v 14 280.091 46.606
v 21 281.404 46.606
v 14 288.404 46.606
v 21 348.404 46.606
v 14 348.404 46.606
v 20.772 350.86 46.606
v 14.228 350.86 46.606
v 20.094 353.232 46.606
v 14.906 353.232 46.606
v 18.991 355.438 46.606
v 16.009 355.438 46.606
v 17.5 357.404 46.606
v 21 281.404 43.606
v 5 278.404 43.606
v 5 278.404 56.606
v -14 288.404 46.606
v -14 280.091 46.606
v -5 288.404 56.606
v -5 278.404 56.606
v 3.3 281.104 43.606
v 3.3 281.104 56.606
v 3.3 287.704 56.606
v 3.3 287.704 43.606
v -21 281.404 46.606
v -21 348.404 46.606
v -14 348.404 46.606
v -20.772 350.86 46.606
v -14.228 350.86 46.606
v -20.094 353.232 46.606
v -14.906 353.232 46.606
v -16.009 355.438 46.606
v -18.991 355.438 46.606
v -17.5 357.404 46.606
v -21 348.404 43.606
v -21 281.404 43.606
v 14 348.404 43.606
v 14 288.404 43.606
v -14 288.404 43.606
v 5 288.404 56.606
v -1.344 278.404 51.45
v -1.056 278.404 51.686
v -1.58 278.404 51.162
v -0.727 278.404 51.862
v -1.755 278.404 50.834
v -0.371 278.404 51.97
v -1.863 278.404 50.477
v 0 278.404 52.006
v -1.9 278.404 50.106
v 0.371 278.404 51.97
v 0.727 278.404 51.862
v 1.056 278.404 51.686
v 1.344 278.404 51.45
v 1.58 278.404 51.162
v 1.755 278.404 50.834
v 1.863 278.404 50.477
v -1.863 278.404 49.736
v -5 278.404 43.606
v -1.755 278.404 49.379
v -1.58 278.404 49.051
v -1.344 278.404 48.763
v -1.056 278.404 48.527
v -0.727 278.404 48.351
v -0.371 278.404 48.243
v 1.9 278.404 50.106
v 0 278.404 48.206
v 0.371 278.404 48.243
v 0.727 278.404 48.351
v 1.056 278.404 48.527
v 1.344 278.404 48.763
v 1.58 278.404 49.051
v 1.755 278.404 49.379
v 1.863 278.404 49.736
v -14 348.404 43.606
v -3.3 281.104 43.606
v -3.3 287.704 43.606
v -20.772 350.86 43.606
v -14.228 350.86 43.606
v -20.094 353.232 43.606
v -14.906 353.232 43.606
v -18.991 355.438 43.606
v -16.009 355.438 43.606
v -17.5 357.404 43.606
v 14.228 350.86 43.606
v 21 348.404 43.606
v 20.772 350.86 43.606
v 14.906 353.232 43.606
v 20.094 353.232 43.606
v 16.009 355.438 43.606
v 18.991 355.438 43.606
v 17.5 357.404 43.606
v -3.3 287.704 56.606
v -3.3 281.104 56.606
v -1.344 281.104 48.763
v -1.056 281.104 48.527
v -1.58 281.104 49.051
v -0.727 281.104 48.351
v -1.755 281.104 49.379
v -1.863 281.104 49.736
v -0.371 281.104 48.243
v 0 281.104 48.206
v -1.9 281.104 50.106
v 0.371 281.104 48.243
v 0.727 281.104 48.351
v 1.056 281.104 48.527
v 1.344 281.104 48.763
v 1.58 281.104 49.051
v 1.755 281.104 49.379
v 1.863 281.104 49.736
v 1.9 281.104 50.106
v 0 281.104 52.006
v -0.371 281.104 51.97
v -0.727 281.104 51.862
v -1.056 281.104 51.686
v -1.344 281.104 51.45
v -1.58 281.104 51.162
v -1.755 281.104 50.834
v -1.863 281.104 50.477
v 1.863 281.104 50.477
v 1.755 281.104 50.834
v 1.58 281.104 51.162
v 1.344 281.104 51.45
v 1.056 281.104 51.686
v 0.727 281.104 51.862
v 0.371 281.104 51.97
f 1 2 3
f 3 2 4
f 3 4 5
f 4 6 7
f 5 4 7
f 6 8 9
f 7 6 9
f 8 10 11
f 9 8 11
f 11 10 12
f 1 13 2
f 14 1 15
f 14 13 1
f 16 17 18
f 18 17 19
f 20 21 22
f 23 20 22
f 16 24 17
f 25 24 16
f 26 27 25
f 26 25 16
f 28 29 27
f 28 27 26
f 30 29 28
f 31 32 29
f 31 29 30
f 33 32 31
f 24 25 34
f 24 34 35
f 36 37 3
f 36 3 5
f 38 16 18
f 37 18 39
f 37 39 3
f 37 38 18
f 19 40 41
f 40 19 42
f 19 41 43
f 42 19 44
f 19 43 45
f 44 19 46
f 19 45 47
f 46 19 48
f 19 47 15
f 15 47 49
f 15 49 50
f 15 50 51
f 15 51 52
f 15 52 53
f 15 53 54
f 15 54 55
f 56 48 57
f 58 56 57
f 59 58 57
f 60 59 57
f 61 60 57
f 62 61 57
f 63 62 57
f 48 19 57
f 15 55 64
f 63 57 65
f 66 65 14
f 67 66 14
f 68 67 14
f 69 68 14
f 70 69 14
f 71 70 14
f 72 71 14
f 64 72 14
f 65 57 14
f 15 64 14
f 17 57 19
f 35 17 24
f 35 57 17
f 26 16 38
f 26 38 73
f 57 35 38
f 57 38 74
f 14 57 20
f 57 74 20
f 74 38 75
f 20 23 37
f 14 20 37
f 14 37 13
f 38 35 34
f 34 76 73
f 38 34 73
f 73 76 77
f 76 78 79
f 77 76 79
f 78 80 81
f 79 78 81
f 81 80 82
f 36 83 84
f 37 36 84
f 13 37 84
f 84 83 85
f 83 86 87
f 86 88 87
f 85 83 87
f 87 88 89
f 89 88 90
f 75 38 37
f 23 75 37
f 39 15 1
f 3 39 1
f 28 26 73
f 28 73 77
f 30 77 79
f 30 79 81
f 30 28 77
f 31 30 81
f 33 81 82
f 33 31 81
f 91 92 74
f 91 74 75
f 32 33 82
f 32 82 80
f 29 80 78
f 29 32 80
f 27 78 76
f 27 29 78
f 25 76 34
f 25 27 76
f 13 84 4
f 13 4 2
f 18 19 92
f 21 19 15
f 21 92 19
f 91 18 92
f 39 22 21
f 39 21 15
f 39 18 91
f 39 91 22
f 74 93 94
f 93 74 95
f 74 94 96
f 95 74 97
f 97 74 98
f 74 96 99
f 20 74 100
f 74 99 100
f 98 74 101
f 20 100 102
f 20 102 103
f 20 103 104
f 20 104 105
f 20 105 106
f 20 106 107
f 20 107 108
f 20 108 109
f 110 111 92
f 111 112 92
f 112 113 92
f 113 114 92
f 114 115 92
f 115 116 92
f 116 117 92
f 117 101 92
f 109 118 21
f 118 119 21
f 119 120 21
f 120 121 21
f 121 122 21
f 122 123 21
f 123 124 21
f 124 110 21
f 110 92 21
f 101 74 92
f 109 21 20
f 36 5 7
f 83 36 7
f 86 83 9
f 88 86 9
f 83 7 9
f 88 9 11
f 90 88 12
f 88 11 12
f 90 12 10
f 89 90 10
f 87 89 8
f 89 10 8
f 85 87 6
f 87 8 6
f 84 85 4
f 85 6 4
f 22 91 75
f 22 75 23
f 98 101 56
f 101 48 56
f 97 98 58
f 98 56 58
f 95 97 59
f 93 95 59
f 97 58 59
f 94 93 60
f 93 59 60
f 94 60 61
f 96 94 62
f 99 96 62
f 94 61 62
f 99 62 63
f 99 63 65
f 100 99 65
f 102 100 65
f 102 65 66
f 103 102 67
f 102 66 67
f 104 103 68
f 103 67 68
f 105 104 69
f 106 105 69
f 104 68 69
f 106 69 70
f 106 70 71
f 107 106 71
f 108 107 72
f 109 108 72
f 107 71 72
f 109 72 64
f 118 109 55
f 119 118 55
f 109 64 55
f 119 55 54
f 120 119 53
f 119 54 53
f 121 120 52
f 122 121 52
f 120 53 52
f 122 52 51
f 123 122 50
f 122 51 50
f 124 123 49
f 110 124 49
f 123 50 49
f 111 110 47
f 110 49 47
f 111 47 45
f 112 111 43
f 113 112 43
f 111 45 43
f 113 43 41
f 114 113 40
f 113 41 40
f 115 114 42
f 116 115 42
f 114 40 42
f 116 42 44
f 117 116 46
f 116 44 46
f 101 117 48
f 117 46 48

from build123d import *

# Parameters (mm, degrees)
SALIENTE_EXTRUIR1_DEPTH             = 3
CROQUIS2_W                          = 10
CROQUIS2_H                          = 10
SALIENTE_EXTRUIR2_DEPTH             = 10
CROQUIS3_W                          = 6.2
CROQUIS3_H                          = 6.2
CORTAR_EXTRUIR1_DEPTH               = 349.280563017
NGULO_START                         = 278.403728499
NGULO_DE_SALIDA1_DEPTH              = 10
NGULO_START_2                       = 46.606431878
NGULO_DE_SALIDA1_2_DEPTH            = 11.393568122
DI_METRO_DE_TALADRO_3_8_3_8_1_D     = 3.8
DI_METRO_DE_TALADRO_3_8_3_8_1_DEPTH = 2.9
REDONDEO1_R                         = 0.4
CROQUIS7_W                          = 7
CROQUIS7_H                          = 10
SALIENTE_EXTRUIR3_DEPTH             = 3
CROQUIS8_W                          = 6.6
CROQUIS8_H                          = 6.6
CORTAR_EXTRUIR2_DEPTH               = 359.256088776


with BuildPart() as part:
    # Croquis1 → Saliente-Extruir1 (new body)
    with BuildSketch(Plane(origin=(0, 0, 43.606431878), x_dir=(-1, 0, 0), z_dir=(0, 0, -1))):
        with BuildLine():
            Line((-21, 338.403728499), (-21, 281.403728499))
            Line((-21, 281.403728499), (-5, 278.403728499))
            Line((-5, 278.403728499), (5, 278.403728499))
            Line((5, 278.403728499), (21, 281.403728499))
            Line((21, 281.403728499), (21, 338.403728499))
            ThreePointArc((21, 338.403728499), (20.094205089, 343.232030478), (17.5, 347.403728499))
            ThreePointArc((17.5, 347.403728499), (14.905794911, 343.232030478), (14, 338.403728499))
            Line((14, 338.403728499), (14, 288.403728499))
            Line((14, 288.403728499), (-14, 288.403728499))
            Line((-14, 288.403728499), (-14, 338.403728499))
            ThreePointArc((-14, 338.403728499), (-14.905794911, 343.232030478), (-17.5, 347.403728499))
            ThreePointArc((-17.5, 347.403728499), (-20.094205089, 343.232030478), (-21, 338.403728499))
        make_face()
    extrude(amount=-SALIENTE_EXTRUIR1_DEPTH)

    # Croquis2 → Saliente-Extruir2 (add)
    with BuildSketch(Plane.XY.offset(46.606431878)):
        with Locations((0, 283.403728499)):
            Rectangle(CROQUIS2_W, CROQUIS2_H)
    extrude(amount=SALIENTE_EXTRUIR2_DEPTH)

    # Croquis3 → Cortar-Extruir1 (cut, through all)
    with BuildSketch(Plane.XY.offset(56.606431878)):
        with Locations((0, 284.403728499)):
            Rectangle(CROQUIS3_W, CROQUIS3_H)
    extrude(amount=-CORTAR_EXTRUIR1_DEPTH, mode=Mode.SUBTRACT)

    # Ángulo de salida1: read off the stored shape, not the designer's step
    # Ángulo de salida1 outline → Ángulo de salida1 (add)
    with BuildSketch(Plane(origin=(0, 0, 0), x_dir=(1, 0, 0), z_dir=(0, 1, 0)).offset(NGULO_START)):
        Polygon((-5, -46.606431878), (-14, -46.606431878), (-5, -56.606431878), align=None)
        Polygon((5, -46.606431878), (5, -56.606431878), (14, -46.606431878), align=None)
    extrude(amount=NGULO_DE_SALIDA1_DEPTH)

    # ngulo de salida1 2 outline → ngulo de salida1 2 (cut)
    with BuildSketch(Plane.XY.offset(NGULO_START_2)):
        Polygon((-5, 278.403728499), (-16, 280.466228499), (-16, 278.403728499), align=None)
        Polygon((15, 280.278728499), (5, 278.403728499), (15, 278.403728499), align=None)
    extrude(amount=NGULO_DE_SALIDA1_2_DEPTH, mode=Mode.SUBTRACT)

    # Diámetro de taladro Ø3.8 (3.8)1
    with Locations(Plane(origin=(0, 281.303728499, 0), x_dir=(1, 0, 0), z_dir=(0, 1, 0))):
        with Locations((0, -50.106431878)):
            Hole(DI_METRO_DE_TALADRO_3_8_3_8_1_D / 2, depth=DI_METRO_DE_TALADRO_3_8_3_8_1_DEPTH)

    # Redondeo1
    redondeo1_edges = [part.edges().sort_by_distance(p)[0] for p in [
        (-17.5, 347.403728499, 45.106431878),
        (17.5, 347.403728499, 45.106431878),
    ]]
    fillet(redondeo1_edges, radius=REDONDEO1_R)

    # Croquis7 → Saliente-Extruir3 (add, through all)
    with BuildSketch(Plane.XY.offset(46.606431878)):
        with BuildLine():
            Line((-14, 338.403728499), (-14, 348.403728499))
            Line((-14, 348.403728499), (-21, 348.403728499))
            Line((-21, 348.403728499), (-21, 338.403728499))
            ThreePointArc((-21, 338.403728499), (-20.175493128, 343.017556325), (-17.804035379, 347.060254302))
            ThreePointArc((-17.804035379, 347.060254302), (-17.5, 347.20032645), (-17.195964621, 347.060254302))
            ThreePointArc((-17.195964621, 347.060254302), (-14.824506872, 343.017556325), (-14, 338.403728499))
        make_face()
        with BuildLine():
            ThreePointArc((-14, 348.403728499), (-14.905794911, 353.232030478), (-17.5, 357.403728499))
            ThreePointArc((-17.5, 357.403728499), (-20.094205089, 353.232030478), (-21, 348.403728499))
            Line((-21, 348.403728499), (-14, 348.403728499))
        make_face()
        with BuildLine():
            ThreePointArc((14, 348.403728499), (14.905794911, 353.232030478), (17.5, 357.403728499))
            ThreePointArc((17.5, 357.403728499), (20.094205089, 353.232030478), (21, 348.403728499))
            Line((21, 348.403728499), (14, 348.403728499))
        make_face()
        with Locations((17.5, 343.403728499)):
            Rectangle(CROQUIS7_W, CROQUIS7_H)
    extrude(amount=-SALIENTE_EXTRUIR3_DEPTH)

    # Croquis8 → Cortar-Extruir2 (cut, through all)
    with BuildSketch(Plane.XY.offset(56.606431878)):
        with Locations((0, 284.403728499)):
            Rectangle(CROQUIS8_W, CROQUIS8_H)
    extrude(amount=-CORTAR_EXTRUIR2_DEPTH, mode=Mode.SUBTRACT)


solid = part.part
